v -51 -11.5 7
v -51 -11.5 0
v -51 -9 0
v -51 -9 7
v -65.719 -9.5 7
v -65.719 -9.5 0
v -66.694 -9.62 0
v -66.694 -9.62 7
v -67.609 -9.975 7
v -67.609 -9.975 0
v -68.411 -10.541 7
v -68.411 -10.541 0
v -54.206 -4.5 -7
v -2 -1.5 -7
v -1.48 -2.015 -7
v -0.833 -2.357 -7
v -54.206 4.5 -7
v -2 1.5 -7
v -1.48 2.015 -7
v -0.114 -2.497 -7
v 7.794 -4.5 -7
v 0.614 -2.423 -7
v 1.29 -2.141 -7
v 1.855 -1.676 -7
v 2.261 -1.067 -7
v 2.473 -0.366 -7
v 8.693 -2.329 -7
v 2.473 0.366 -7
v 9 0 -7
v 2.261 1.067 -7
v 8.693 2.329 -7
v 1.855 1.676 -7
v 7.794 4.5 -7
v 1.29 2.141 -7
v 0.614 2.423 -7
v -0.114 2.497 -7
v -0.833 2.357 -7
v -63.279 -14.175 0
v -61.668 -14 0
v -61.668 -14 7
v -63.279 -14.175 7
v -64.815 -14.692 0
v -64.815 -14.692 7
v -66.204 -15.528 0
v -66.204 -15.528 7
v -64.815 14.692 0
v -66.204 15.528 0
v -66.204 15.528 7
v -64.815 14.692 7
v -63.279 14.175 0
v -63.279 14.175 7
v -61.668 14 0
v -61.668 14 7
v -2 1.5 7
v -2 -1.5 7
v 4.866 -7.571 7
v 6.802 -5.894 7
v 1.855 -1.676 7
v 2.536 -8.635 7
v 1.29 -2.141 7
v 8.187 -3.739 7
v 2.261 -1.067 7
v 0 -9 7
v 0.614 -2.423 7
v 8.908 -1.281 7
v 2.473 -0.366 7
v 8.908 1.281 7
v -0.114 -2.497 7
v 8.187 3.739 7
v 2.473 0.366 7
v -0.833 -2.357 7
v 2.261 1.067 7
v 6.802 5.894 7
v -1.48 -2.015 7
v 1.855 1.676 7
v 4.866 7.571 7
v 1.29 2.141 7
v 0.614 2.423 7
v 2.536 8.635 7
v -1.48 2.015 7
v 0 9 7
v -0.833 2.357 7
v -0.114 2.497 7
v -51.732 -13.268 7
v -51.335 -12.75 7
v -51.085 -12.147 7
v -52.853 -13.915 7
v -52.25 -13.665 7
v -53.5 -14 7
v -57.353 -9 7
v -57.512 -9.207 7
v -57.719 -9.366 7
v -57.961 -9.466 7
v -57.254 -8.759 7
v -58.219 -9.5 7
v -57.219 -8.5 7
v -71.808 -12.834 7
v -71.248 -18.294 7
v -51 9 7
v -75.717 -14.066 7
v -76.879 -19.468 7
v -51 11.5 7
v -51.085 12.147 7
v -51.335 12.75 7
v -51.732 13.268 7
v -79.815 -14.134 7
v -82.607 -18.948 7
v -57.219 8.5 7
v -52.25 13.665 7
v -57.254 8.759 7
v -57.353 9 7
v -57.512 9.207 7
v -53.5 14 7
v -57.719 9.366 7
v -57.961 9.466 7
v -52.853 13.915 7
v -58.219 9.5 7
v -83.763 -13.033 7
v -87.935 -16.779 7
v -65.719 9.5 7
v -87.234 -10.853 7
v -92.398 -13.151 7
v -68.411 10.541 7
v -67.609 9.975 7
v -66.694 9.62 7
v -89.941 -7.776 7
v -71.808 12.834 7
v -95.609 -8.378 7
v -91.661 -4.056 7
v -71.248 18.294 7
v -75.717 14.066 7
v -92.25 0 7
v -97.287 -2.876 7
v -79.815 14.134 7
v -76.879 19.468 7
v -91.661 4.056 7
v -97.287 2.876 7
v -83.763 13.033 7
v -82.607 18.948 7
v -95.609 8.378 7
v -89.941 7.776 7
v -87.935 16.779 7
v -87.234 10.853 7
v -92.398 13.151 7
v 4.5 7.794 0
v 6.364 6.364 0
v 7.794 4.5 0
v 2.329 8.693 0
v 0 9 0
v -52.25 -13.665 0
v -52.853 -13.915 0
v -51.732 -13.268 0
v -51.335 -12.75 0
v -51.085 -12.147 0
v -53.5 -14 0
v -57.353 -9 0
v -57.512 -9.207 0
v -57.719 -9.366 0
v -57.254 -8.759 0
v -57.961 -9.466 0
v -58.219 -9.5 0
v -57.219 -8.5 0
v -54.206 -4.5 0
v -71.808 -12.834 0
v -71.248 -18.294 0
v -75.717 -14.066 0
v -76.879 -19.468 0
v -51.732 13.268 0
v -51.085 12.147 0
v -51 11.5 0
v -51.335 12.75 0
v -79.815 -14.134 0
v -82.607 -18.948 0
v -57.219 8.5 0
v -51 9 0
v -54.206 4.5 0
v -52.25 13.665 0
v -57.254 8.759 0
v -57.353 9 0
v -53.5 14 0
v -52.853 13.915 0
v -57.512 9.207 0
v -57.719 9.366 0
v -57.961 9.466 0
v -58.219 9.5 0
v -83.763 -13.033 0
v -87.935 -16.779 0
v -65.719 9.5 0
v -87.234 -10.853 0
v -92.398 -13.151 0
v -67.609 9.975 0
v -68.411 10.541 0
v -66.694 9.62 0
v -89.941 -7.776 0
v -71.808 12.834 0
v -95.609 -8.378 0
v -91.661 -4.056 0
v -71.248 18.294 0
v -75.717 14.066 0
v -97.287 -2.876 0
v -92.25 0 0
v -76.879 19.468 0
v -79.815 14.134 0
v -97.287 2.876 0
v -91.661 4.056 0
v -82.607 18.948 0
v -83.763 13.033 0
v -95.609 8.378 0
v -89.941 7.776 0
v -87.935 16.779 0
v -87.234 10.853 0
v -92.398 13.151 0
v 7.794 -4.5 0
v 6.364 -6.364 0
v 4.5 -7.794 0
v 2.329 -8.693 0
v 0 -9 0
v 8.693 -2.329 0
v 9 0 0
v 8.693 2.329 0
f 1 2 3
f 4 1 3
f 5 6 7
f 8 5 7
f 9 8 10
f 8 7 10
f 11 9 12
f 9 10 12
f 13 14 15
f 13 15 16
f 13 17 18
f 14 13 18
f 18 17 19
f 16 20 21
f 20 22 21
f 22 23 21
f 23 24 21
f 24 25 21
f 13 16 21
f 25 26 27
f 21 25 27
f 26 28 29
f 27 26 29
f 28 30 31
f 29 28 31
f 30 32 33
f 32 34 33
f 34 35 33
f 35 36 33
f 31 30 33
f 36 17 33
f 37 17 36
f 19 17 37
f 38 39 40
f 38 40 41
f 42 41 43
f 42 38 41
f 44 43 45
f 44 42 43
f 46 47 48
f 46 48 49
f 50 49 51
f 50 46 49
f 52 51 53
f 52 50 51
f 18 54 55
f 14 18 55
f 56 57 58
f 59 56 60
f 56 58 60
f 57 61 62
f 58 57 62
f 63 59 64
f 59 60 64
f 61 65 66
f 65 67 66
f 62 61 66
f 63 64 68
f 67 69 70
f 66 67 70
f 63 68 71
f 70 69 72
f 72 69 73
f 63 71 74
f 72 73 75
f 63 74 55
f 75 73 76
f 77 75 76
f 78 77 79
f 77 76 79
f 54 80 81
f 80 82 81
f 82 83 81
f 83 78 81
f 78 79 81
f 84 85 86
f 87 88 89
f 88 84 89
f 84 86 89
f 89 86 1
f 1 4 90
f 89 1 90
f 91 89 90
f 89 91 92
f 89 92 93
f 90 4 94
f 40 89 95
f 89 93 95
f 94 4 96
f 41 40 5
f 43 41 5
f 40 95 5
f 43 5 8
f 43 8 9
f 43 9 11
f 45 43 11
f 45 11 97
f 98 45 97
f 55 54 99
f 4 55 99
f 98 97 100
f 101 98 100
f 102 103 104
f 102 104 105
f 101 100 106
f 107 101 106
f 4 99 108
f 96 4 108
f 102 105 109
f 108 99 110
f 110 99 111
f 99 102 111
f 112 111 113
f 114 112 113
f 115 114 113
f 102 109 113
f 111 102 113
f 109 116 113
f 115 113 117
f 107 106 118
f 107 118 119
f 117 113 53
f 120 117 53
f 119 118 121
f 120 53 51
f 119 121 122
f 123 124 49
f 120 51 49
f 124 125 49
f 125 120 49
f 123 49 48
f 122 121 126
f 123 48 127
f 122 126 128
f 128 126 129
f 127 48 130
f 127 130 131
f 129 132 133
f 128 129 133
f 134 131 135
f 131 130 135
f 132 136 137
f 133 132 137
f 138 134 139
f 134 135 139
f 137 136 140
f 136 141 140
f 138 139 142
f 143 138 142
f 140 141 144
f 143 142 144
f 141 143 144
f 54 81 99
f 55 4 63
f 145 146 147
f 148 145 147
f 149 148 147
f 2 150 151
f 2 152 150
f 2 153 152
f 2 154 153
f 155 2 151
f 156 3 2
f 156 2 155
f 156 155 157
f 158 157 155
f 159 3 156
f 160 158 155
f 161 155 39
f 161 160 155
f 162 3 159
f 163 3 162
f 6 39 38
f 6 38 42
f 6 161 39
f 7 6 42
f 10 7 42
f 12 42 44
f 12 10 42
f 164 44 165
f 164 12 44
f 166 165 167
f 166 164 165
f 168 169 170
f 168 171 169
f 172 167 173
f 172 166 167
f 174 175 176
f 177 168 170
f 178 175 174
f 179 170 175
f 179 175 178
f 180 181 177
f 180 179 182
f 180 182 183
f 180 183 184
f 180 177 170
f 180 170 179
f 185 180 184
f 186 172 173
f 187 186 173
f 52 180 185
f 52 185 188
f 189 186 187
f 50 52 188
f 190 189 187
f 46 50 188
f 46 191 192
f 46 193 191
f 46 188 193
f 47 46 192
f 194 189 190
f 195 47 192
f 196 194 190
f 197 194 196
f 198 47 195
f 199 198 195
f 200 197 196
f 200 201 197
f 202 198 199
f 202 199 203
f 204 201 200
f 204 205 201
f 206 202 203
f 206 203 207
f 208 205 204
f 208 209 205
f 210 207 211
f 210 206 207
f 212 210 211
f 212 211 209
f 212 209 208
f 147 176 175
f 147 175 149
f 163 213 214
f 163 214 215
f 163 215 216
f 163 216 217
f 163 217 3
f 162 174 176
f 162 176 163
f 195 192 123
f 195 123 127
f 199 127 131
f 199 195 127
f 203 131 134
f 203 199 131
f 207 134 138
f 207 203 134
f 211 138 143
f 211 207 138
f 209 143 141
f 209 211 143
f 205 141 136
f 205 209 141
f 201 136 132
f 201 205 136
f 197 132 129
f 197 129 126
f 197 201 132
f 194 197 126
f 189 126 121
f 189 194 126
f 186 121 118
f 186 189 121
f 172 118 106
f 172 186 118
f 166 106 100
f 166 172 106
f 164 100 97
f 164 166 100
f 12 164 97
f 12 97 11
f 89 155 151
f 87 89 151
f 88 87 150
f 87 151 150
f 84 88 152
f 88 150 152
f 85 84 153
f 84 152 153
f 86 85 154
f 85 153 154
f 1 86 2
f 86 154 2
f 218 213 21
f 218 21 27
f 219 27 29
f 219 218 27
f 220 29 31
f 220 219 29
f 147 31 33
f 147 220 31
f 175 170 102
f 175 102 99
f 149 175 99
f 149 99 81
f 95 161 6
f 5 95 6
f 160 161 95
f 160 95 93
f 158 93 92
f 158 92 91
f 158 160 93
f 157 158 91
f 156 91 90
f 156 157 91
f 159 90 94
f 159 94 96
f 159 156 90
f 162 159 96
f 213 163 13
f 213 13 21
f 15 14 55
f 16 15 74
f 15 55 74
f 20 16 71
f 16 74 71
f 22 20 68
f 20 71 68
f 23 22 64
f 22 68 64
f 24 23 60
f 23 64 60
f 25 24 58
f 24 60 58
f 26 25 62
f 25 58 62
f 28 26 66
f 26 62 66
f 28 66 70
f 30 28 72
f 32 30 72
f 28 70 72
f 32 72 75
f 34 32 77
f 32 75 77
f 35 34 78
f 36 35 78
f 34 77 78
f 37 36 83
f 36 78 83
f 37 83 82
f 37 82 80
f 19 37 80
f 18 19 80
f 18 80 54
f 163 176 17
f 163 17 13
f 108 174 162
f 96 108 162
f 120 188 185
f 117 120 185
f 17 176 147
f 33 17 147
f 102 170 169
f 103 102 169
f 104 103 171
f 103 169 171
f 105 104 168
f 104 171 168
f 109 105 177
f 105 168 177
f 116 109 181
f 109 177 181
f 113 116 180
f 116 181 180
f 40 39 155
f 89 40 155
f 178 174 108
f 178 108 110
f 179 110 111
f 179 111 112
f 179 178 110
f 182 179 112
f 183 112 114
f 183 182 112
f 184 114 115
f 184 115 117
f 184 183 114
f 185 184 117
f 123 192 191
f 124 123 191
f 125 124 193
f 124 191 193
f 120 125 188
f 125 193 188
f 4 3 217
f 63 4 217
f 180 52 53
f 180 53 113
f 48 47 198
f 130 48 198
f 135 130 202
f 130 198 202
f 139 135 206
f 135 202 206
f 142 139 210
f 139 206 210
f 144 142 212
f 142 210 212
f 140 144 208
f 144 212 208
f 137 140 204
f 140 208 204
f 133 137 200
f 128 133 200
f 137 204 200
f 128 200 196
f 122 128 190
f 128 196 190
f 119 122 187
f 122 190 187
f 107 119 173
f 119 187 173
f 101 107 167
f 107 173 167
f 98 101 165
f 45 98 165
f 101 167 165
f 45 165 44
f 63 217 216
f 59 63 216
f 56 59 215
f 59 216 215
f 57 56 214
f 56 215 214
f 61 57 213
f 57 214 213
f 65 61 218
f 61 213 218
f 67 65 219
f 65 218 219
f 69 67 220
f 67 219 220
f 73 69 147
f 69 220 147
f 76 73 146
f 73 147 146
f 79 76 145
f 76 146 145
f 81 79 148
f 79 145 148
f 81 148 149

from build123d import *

# Parameters (mm, degrees)
PAD_DEPTH         = 7
PAD001_DEPTH      = 7
POCKET_DEPTH      = 7.001
POCKET_DEPTH_BACK = 7.001


with BuildPart() as part:
    # Sketch → Pad (new body)
    with BuildSketch(Plane.XY):
        with BuildLine():
            Line((-51, 9), (0, 9))
            ThreePointArc((0, -9), (9, 0), (0, 9))
            Line((-51, -9), (0, -9))
            Line((-51, -11.5), (-51, -9))
            ThreePointArc((-53.5, -14), (-51.732233, -13.267767), (-51, -11.5))
            Line((-61.667517, -14), (-53.5, -14))
            ThreePointArc((-61.667517, -14), (-64.061085, -14.392199), (-66.204318, -15.527778))
            ThreePointArc((-66.204318, 15.527778), (-97.5, 0), (-66.204318, -15.527778))
            ThreePointArc((-66.204318, 15.527778), (-64.061085, 14.392199), (-61.667517, 14))
            Line((-61.667517, 14), (-53.5, 14))
            ThreePointArc((-51, 11.5), (-51.732233, 13.267767), (-53.5, 14))
            Line((-51, 11.5), (-51, 9))
        make_face()
        with BuildLine():
            Line((-65.719426, 9.5), (-58.219426, 9.5))
            ThreePointArc((-57.219426, 8.5), (-57.512319, 9.207107), (-58.219426, 9.5))
            Line((-57.219426, 8.5), (-57.219426, -8.5))
            ThreePointArc((-58.219426, -9.5), (-57.512319, -9.207107), (-57.219426, -8.5))
            Line((-58.219426, -9.5), (-65.719426, -9.5))
            ThreePointArc((-65.719426, -9.5), (-67.162406, -9.769342), (-68.411059, -10.541096))
            ThreePointArc((-68.411059, 10.541096), (-92.25, 0), (-68.411059, -10.541096))
            ThreePointArc((-68.411059, 10.541096), (-67.162406, 9.769342), (-65.719426, 9.5))
        make_face(mode=Mode.SUBTRACT)
    extrude(amount=PAD_DEPTH)

    # Sketch001 → Pad001 (join)
    with BuildSketch(Plane.XY):
        with BuildLine():
            Line((-54.205771, 4.5), (-54.205771, -4.5))
            Line((-54.205771, -4.5), (7.794229, -4.5))
            ThreePointArc((7.794229, -4.5), (9, 0), (7.794229, 4.5))
            Line((-54.205771, 4.5), (7.794229, 4.5))
        make_face()
    extrude(amount=-PAD001_DEPTH)

    # Sketch002 → Pocket (cut, two sides)
    with BuildSketch(Plane.XY) as pocket_sk:
        with BuildLine():
            Line((-2, 1.5), (-2, -1.5))
            ThreePointArc((-2, -1.5), (2.5, 0), (-2, 1.5))
        make_face()
    extrude(amount=-POCKET_DEPTH, mode=Mode.SUBTRACT)
    extrude(pocket_sk.sketch, amount=POCKET_DEPTH_BACK, mode=Mode.SUBTRACT)


solid = part.part
